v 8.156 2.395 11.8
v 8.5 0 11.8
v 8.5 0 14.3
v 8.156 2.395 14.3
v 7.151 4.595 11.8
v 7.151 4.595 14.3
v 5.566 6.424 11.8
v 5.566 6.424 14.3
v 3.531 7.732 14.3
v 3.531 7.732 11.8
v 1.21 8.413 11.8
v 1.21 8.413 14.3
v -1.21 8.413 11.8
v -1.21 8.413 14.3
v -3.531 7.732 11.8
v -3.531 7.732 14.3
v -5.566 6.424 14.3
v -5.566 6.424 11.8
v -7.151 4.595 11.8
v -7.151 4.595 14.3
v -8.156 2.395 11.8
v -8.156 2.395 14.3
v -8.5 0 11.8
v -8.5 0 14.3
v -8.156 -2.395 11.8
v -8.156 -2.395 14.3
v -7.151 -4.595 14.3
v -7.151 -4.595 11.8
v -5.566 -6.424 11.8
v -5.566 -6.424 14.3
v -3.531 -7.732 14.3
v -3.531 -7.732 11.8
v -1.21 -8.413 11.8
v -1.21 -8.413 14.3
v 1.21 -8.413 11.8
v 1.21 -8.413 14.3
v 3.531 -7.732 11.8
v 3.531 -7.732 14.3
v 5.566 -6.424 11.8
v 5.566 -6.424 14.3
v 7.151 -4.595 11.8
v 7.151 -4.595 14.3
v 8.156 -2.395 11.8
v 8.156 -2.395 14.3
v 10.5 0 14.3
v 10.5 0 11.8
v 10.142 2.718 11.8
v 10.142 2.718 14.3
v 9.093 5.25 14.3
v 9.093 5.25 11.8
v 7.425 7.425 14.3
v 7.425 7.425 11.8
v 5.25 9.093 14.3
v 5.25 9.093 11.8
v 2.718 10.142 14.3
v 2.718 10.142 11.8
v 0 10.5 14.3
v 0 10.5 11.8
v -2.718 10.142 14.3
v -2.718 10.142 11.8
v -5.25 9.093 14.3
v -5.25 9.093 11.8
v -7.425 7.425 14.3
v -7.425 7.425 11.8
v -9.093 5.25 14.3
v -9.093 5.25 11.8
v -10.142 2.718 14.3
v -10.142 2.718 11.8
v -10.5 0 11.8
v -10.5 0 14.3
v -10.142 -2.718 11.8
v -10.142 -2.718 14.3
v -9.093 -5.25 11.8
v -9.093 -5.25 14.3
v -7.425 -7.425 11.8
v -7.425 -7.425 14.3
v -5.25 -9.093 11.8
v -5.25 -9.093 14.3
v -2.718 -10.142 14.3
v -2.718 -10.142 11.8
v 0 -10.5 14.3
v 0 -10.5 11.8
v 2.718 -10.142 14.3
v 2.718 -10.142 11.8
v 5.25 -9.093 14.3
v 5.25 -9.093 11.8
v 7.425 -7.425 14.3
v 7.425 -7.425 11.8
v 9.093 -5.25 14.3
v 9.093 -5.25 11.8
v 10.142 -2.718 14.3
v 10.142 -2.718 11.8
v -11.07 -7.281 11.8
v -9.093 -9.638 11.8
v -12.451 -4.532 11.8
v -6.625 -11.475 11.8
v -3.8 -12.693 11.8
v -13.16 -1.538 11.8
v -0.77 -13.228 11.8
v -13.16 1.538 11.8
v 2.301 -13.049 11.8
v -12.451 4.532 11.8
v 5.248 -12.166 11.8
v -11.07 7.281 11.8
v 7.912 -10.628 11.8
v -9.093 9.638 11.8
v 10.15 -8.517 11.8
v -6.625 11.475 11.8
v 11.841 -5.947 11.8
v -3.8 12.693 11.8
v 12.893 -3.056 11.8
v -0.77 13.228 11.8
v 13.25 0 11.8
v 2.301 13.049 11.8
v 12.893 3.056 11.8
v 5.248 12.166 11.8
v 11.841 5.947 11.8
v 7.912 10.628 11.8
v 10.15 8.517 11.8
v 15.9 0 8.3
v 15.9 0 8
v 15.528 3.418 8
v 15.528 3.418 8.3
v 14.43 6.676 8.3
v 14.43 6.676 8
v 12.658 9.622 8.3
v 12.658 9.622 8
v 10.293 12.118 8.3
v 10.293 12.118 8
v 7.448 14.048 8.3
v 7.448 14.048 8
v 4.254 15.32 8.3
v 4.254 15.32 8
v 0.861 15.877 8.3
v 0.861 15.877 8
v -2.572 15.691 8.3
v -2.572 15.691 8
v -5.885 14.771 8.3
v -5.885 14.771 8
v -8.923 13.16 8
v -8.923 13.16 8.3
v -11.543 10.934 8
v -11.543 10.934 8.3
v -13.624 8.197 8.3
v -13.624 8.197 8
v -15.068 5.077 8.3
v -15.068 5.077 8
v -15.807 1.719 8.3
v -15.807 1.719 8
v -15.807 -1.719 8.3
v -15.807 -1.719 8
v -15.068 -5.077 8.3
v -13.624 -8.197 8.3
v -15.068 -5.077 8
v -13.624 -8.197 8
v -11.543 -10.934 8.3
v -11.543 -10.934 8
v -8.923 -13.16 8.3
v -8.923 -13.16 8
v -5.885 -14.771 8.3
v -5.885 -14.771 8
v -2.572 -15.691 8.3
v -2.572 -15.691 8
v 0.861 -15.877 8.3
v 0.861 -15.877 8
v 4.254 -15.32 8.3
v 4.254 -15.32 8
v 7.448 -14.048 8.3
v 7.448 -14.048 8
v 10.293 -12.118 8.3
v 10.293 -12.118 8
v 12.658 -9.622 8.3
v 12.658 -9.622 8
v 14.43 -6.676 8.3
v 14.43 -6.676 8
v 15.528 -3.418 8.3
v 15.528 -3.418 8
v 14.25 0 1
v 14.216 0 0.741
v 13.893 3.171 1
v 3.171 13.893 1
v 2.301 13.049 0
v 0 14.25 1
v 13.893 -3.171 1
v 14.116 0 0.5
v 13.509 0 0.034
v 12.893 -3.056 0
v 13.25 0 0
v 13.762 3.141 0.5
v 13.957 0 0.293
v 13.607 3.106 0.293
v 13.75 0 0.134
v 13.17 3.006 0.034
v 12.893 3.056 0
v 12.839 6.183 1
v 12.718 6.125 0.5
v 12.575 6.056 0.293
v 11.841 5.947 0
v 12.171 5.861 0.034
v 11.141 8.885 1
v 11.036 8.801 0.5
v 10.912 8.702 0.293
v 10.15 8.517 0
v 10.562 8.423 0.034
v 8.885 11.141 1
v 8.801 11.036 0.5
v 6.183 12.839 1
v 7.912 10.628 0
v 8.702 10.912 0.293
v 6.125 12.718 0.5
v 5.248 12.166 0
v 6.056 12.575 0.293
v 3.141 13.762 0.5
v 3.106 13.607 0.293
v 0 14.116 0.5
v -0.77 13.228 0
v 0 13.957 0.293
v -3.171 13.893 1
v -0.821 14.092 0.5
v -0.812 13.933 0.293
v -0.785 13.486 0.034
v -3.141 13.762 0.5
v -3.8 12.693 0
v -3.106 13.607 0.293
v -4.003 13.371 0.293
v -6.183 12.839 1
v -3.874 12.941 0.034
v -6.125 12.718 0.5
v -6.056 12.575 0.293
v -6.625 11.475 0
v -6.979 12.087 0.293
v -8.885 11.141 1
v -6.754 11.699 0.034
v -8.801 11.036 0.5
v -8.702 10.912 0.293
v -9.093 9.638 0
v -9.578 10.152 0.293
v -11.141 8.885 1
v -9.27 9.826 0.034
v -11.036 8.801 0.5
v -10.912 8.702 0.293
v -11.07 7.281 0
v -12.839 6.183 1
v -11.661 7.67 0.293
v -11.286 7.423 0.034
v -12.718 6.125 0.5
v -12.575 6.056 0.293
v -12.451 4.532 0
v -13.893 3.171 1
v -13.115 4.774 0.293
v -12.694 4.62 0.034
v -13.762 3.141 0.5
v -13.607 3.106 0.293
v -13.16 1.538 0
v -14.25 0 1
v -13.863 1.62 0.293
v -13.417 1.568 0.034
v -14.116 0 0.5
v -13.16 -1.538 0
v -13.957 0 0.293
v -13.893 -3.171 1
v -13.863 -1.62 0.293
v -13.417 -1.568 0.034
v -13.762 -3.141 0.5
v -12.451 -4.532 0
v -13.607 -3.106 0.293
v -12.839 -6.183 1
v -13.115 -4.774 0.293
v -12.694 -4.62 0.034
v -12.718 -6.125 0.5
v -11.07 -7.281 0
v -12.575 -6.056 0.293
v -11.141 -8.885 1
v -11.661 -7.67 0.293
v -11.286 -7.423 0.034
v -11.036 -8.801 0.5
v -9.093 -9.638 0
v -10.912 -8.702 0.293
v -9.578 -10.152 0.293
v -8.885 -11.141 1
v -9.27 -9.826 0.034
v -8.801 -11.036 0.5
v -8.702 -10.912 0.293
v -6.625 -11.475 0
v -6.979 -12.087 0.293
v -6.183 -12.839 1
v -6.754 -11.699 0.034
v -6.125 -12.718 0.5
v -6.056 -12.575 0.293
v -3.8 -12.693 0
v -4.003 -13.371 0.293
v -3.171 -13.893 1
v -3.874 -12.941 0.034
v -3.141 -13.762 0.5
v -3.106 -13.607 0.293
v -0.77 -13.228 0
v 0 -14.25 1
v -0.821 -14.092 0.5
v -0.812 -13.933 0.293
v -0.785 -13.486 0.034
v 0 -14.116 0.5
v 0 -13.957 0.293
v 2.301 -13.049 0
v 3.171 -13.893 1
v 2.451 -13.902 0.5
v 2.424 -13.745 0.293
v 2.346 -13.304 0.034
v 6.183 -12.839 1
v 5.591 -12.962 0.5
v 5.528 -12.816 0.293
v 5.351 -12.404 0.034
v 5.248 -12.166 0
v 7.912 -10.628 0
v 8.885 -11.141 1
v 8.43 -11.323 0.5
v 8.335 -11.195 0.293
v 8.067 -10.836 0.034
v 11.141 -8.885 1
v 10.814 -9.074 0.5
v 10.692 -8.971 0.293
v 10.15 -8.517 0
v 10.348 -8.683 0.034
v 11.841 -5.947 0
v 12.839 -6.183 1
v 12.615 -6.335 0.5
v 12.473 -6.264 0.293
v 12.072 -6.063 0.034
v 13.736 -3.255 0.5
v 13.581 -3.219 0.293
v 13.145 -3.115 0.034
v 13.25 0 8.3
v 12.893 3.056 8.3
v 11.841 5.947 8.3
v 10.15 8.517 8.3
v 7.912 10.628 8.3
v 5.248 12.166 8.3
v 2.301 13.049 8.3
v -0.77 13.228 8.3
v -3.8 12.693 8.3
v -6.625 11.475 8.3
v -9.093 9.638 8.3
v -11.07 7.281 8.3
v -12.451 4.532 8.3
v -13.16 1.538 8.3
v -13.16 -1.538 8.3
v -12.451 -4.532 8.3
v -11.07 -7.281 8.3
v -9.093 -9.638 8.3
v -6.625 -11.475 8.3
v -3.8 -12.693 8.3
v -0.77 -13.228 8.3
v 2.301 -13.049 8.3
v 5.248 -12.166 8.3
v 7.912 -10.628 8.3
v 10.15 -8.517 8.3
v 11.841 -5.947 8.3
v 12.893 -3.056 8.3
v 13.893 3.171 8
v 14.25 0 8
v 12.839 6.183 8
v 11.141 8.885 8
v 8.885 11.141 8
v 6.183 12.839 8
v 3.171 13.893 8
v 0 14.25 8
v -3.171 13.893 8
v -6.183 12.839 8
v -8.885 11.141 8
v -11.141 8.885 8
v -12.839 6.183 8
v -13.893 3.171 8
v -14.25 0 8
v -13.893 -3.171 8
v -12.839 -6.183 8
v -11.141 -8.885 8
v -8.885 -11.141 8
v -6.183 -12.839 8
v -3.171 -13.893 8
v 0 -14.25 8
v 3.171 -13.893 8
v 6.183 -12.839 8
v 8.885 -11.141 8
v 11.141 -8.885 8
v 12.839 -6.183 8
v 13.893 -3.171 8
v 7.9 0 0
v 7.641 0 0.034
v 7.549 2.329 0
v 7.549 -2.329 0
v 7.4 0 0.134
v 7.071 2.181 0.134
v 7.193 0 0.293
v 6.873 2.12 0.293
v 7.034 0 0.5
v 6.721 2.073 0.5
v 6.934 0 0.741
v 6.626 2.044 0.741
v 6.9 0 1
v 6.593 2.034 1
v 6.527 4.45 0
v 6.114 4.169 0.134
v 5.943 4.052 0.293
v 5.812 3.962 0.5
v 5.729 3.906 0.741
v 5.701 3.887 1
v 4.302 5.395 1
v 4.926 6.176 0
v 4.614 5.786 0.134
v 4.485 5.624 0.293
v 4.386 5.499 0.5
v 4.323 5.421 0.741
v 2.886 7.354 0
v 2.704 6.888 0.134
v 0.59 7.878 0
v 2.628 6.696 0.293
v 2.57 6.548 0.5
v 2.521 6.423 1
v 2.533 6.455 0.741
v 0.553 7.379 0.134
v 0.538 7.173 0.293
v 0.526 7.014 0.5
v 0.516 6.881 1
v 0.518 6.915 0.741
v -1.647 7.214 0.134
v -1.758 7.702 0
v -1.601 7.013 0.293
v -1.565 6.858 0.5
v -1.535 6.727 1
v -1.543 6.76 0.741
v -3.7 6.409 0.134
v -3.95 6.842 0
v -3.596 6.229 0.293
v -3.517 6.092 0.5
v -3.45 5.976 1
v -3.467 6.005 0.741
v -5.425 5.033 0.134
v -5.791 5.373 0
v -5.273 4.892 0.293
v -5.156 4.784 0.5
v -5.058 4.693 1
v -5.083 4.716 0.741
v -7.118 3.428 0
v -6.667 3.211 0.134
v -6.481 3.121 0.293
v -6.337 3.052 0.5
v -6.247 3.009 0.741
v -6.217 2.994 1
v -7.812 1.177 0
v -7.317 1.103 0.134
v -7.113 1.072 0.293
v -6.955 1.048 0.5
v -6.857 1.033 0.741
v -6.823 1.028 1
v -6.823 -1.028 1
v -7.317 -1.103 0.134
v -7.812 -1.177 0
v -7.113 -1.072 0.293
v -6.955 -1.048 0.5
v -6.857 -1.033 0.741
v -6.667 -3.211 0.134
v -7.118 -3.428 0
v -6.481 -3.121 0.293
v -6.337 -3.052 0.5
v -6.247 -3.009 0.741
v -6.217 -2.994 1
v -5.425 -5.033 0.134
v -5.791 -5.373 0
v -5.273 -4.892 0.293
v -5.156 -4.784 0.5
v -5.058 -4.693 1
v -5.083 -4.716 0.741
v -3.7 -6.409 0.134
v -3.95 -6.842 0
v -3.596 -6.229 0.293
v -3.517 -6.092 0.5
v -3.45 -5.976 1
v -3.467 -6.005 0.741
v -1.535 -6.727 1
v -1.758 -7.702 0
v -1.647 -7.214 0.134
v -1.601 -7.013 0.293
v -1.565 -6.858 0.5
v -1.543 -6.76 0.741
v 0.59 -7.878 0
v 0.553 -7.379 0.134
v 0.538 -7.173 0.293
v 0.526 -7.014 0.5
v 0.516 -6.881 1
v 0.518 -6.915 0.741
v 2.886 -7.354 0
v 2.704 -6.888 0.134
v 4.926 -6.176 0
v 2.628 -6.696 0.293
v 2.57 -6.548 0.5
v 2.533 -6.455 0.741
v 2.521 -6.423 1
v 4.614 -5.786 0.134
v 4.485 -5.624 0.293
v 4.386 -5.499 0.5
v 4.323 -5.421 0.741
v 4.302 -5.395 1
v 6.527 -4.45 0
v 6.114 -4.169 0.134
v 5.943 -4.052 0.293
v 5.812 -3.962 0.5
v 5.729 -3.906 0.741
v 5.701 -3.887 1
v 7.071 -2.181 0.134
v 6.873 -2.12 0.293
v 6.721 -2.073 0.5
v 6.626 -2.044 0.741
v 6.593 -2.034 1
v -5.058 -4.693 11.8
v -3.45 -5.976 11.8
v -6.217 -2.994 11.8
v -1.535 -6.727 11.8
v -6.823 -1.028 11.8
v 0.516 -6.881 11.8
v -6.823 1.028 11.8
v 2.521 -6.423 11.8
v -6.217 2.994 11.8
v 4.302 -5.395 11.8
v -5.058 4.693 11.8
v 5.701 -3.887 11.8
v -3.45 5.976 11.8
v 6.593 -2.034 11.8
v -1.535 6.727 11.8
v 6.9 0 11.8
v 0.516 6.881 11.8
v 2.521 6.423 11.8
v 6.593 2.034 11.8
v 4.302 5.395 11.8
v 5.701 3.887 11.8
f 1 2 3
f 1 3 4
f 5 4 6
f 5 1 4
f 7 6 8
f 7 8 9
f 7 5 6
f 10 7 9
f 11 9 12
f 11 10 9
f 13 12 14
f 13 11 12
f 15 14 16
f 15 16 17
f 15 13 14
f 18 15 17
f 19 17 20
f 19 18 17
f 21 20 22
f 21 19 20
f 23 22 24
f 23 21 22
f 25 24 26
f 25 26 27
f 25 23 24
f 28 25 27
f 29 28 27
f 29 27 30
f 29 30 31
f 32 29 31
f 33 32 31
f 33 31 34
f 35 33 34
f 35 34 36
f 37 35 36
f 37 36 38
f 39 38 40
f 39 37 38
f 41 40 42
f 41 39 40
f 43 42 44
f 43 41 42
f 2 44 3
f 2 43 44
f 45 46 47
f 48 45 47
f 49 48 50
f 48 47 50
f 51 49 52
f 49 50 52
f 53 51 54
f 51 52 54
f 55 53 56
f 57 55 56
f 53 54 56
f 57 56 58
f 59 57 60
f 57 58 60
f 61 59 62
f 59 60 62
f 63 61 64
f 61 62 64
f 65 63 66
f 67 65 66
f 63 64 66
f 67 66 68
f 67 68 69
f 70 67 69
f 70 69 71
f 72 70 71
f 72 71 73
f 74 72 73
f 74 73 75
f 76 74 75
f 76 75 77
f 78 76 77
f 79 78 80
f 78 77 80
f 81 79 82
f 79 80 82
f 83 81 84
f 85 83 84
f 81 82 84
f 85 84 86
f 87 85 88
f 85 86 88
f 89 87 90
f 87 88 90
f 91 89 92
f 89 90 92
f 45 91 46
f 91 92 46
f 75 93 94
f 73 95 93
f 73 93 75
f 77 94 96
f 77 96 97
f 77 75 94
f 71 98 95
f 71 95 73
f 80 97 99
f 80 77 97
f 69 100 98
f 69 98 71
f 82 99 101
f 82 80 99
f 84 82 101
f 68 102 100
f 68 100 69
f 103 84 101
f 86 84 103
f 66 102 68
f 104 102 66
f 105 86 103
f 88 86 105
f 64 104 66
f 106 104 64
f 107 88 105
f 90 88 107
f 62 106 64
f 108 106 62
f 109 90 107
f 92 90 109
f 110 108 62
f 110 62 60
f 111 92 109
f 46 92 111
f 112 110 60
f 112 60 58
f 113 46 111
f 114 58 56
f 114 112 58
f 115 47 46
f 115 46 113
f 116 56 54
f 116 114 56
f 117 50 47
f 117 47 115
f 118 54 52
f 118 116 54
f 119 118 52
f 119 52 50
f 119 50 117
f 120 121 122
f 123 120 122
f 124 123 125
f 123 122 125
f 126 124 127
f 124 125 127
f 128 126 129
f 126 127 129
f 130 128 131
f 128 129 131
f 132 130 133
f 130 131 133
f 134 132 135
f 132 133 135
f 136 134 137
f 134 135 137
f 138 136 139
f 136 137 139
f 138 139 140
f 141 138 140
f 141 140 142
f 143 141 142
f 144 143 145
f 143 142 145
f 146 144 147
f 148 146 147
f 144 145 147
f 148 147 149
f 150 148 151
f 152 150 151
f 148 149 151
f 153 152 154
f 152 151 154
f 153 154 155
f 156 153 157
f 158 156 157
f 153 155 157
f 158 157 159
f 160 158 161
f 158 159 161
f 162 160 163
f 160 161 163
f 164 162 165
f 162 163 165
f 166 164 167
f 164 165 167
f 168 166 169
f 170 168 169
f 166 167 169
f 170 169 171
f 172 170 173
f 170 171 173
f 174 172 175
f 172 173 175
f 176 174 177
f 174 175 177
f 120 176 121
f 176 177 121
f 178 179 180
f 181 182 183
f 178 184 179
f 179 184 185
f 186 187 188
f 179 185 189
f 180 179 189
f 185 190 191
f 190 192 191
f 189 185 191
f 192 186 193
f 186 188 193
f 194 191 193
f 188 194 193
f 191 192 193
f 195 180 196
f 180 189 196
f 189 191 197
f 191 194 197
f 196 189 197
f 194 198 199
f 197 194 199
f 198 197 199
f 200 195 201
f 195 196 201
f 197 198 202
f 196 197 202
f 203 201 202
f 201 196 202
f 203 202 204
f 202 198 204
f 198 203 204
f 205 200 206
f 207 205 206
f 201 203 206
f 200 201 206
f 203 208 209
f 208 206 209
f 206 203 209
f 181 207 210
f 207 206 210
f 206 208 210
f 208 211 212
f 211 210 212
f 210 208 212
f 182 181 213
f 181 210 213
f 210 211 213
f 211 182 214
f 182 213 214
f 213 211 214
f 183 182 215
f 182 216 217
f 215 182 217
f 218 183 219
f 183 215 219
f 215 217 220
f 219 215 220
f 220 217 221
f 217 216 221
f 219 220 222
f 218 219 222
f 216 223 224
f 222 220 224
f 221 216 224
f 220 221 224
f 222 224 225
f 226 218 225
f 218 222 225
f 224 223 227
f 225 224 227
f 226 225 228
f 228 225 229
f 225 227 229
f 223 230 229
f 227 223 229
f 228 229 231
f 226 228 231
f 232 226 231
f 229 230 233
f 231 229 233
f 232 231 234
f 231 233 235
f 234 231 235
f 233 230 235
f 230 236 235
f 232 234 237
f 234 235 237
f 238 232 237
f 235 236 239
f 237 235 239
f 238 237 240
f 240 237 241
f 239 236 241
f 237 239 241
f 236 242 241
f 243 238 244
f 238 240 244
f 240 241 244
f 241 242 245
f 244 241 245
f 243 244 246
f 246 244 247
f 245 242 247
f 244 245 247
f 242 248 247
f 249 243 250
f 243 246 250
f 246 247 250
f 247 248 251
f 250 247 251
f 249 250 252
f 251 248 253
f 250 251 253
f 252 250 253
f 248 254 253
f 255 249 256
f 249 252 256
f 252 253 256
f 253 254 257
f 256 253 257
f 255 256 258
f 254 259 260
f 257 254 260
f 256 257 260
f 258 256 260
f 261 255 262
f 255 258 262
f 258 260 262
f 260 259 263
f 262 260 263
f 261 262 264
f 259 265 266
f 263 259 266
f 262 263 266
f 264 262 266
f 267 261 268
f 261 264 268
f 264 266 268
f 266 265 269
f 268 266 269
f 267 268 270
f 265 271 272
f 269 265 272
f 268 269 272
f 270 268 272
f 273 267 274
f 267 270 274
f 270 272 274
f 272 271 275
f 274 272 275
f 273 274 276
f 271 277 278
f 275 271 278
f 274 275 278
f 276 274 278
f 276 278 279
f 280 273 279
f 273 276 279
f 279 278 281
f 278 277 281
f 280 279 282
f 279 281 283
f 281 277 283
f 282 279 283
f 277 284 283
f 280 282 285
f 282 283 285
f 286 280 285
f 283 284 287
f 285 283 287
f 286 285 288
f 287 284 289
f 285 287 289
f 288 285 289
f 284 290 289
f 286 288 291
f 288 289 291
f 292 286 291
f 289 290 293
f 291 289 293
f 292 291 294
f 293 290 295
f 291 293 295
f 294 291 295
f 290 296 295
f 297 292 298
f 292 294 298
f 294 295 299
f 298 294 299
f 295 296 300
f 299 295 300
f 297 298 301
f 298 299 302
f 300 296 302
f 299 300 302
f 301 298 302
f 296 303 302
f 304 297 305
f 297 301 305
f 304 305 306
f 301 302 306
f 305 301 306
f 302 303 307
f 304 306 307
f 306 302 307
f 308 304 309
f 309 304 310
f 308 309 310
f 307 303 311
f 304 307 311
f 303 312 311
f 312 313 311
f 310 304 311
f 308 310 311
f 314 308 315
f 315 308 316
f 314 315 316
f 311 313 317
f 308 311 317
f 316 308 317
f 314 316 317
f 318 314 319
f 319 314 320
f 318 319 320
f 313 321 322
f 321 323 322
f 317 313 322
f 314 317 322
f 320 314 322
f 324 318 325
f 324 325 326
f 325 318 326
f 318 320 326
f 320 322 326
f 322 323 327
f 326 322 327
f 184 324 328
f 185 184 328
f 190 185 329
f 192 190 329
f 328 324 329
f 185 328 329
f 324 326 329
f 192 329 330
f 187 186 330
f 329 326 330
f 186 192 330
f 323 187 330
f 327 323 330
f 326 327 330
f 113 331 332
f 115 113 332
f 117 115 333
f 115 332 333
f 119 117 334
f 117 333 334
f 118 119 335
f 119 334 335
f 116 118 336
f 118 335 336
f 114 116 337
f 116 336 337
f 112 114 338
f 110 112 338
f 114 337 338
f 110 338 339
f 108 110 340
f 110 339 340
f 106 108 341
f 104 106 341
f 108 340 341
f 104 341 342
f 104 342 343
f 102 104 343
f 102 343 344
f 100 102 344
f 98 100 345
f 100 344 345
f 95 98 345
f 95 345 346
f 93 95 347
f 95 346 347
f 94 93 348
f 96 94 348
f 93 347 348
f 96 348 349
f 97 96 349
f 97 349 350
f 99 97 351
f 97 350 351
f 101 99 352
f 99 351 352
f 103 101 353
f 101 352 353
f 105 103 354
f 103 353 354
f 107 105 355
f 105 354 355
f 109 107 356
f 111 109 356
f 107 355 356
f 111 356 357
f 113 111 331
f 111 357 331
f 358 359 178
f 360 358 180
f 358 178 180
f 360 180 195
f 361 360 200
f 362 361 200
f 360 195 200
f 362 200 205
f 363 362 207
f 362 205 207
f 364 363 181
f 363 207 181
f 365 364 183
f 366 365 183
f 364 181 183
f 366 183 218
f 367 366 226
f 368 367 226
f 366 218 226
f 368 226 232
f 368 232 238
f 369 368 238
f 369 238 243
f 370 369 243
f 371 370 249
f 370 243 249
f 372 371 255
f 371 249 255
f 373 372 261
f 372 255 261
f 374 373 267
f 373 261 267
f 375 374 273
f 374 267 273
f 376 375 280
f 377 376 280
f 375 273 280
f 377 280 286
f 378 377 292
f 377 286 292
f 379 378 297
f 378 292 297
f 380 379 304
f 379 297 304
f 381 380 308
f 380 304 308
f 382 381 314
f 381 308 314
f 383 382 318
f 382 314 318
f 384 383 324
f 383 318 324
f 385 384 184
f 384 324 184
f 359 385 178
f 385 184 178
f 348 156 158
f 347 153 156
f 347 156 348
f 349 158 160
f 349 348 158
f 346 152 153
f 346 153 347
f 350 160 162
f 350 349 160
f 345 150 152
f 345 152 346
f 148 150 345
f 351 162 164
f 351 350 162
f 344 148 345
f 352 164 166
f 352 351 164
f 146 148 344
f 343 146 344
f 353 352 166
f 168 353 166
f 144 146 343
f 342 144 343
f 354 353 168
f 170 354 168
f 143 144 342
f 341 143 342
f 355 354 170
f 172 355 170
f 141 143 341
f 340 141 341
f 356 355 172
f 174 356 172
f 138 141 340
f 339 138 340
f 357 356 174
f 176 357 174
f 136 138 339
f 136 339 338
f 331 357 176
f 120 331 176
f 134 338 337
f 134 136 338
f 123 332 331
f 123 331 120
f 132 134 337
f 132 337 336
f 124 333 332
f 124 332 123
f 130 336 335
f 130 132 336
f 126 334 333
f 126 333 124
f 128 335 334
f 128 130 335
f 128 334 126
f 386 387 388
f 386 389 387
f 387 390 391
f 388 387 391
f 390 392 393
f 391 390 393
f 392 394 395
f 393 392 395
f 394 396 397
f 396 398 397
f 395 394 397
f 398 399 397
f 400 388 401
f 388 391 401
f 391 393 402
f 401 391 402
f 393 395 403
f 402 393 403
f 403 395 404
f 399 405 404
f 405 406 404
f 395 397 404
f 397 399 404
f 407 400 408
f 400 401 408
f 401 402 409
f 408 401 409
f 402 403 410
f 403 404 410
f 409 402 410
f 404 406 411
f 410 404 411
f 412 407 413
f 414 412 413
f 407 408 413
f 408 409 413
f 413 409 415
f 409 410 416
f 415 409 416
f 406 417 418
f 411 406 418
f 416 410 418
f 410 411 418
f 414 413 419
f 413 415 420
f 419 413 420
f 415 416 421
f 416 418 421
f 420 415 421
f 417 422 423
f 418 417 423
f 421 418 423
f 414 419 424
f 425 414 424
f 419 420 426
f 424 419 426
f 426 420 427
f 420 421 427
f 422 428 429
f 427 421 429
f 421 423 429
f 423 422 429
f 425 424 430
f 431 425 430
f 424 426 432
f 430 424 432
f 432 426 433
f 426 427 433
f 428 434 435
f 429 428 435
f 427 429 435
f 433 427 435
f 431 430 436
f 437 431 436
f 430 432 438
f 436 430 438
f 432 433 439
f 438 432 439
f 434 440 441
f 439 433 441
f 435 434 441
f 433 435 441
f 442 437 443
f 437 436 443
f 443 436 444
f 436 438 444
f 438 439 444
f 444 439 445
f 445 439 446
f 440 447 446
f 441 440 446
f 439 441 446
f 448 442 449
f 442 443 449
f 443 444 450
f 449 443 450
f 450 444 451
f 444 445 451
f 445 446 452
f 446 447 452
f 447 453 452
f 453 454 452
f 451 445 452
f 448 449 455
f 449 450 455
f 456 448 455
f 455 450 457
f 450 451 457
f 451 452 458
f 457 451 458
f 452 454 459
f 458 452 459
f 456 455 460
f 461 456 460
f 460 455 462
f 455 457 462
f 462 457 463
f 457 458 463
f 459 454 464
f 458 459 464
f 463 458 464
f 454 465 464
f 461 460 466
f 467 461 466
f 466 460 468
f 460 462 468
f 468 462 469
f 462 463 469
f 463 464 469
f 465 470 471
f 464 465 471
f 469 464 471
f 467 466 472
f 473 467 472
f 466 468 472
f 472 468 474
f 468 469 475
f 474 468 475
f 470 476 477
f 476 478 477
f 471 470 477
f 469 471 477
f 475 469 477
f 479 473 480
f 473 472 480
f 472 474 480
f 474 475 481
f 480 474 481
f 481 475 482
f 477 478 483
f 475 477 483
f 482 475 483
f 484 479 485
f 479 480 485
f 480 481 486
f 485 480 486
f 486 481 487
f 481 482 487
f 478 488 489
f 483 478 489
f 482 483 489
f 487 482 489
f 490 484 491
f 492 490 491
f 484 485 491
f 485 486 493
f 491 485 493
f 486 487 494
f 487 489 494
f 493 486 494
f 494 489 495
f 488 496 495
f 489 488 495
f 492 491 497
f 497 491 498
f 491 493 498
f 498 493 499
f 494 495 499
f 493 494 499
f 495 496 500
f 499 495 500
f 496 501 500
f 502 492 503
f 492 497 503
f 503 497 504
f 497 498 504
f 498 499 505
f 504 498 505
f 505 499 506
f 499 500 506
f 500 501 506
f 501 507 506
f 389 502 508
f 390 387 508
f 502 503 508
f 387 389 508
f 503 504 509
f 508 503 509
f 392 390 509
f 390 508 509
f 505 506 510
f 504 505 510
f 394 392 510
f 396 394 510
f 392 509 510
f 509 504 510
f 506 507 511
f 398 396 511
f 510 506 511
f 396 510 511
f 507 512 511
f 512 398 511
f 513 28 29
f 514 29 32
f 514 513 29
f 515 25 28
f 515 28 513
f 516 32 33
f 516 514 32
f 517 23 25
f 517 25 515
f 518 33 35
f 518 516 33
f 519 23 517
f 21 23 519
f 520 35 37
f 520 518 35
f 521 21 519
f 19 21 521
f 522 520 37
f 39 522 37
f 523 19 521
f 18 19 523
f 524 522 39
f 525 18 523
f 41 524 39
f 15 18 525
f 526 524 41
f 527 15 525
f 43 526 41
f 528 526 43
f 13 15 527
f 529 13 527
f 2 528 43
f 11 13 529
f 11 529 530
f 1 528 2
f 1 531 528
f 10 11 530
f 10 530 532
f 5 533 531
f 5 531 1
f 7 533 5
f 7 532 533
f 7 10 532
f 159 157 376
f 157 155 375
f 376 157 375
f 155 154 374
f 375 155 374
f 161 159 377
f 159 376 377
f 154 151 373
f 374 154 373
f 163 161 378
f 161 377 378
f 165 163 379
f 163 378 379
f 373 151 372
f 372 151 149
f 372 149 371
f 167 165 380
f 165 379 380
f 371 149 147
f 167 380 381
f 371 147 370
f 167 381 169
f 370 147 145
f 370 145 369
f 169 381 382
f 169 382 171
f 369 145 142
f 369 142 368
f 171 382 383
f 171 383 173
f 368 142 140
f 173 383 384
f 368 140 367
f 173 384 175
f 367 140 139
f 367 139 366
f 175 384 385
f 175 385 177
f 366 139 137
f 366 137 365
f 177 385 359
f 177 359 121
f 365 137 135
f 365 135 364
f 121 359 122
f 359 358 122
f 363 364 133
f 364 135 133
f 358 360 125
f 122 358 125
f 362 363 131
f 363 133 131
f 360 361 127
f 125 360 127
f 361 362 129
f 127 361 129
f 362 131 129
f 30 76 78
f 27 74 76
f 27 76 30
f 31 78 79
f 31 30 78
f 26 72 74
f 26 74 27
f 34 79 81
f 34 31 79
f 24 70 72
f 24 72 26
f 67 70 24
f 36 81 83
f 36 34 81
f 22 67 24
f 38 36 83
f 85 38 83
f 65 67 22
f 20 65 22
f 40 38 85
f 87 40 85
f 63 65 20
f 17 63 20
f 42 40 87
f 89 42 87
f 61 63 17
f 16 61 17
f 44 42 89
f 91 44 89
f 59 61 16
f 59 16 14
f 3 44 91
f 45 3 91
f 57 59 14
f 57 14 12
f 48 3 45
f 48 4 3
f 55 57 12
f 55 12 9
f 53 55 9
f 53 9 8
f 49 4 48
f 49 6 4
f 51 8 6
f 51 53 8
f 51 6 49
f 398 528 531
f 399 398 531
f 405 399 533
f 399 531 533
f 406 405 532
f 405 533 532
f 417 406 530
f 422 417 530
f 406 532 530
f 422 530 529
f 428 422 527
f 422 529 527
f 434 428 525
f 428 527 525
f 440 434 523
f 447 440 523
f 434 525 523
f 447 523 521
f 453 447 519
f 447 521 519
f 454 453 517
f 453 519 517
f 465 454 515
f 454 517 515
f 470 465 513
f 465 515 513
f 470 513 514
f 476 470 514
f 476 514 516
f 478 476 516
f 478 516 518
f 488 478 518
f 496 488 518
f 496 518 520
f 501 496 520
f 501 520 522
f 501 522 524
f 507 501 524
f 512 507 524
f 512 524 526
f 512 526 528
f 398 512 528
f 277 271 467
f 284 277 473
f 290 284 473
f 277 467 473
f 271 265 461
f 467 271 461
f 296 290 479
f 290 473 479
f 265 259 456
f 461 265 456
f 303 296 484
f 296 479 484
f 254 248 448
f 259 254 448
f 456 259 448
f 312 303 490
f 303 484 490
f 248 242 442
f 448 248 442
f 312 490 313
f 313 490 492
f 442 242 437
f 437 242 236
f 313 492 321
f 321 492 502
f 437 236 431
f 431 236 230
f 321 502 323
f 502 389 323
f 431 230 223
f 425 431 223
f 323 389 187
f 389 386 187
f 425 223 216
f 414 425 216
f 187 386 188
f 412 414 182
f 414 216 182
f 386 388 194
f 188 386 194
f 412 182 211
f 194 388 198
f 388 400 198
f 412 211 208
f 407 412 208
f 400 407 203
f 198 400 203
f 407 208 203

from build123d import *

# Parameters (mm, degrees)
SKETCH_R      = 14.25
PAD_DEPTH     = 8
SKETCH001_R   = 15.9
PAD001_DEPTH  = 0.3
SKETCH002_R   = 13.25
PAD002_DEPTH  = 3.5
SKETCH003_R   = 10.5
SKETCH003_R_2 = 8.5
PAD003_DEPTH  = 2.5
SKETCH004_R   = 6.9
POCKET_DEPTH  = 11.801
FILLET_R      = 1
FILLET001_R   = 1


with BuildPart() as part:
    # Sketch → Pad (new body)
    with BuildSketch(Plane.XY):
        Circle(SKETCH_R)
    extrude(amount=PAD_DEPTH)

    # Sketch001 (on Face3 of Pad) → Pad001 (join)
    with BuildSketch(Plane.XY.offset(8)):
        Circle(SKETCH001_R)
    extrude(amount=PAD001_DEPTH)

    # Sketch002 (on Face3 of Pad001) → Pad002 (join)
    with BuildSketch(Plane.XY.offset(8.3)):
        Circle(SKETCH002_R)
    extrude(amount=PAD002_DEPTH)

    # Sketch003 (on Face7 of Pad002) → Pad003 (join)
    with BuildSketch(Plane.XY.offset(11.8)):
        Circle(SKETCH003_R)
        Circle(SKETCH003_R_2, mode=Mode.SUBTRACT)
    extrude(amount=PAD003_DEPTH)

    # Sketch004 (on Face11 of Pad003) → Pocket (cut, through all)
    with BuildSketch(Plane.XY.offset(11.8)):
        Circle(SKETCH004_R)
    extrude(amount=-POCKET_DEPTH, mode=Mode.SUBTRACT)

    # Fillet
    fillet_edges = [part.edges().sort_by_distance(p)[0] for p in [
        (-14.25, 0, 0),
    ]]
    fillet(fillet_edges, radius=FILLET_R)

    # Fillet001
    fillet001_edges = [part.edges().sort_by_distance(p)[0] for p in [
        (-6.9, 0, 0),
    ]]
    fillet(fillet001_edges, radius=FILLET001_R)


solid = part.part
